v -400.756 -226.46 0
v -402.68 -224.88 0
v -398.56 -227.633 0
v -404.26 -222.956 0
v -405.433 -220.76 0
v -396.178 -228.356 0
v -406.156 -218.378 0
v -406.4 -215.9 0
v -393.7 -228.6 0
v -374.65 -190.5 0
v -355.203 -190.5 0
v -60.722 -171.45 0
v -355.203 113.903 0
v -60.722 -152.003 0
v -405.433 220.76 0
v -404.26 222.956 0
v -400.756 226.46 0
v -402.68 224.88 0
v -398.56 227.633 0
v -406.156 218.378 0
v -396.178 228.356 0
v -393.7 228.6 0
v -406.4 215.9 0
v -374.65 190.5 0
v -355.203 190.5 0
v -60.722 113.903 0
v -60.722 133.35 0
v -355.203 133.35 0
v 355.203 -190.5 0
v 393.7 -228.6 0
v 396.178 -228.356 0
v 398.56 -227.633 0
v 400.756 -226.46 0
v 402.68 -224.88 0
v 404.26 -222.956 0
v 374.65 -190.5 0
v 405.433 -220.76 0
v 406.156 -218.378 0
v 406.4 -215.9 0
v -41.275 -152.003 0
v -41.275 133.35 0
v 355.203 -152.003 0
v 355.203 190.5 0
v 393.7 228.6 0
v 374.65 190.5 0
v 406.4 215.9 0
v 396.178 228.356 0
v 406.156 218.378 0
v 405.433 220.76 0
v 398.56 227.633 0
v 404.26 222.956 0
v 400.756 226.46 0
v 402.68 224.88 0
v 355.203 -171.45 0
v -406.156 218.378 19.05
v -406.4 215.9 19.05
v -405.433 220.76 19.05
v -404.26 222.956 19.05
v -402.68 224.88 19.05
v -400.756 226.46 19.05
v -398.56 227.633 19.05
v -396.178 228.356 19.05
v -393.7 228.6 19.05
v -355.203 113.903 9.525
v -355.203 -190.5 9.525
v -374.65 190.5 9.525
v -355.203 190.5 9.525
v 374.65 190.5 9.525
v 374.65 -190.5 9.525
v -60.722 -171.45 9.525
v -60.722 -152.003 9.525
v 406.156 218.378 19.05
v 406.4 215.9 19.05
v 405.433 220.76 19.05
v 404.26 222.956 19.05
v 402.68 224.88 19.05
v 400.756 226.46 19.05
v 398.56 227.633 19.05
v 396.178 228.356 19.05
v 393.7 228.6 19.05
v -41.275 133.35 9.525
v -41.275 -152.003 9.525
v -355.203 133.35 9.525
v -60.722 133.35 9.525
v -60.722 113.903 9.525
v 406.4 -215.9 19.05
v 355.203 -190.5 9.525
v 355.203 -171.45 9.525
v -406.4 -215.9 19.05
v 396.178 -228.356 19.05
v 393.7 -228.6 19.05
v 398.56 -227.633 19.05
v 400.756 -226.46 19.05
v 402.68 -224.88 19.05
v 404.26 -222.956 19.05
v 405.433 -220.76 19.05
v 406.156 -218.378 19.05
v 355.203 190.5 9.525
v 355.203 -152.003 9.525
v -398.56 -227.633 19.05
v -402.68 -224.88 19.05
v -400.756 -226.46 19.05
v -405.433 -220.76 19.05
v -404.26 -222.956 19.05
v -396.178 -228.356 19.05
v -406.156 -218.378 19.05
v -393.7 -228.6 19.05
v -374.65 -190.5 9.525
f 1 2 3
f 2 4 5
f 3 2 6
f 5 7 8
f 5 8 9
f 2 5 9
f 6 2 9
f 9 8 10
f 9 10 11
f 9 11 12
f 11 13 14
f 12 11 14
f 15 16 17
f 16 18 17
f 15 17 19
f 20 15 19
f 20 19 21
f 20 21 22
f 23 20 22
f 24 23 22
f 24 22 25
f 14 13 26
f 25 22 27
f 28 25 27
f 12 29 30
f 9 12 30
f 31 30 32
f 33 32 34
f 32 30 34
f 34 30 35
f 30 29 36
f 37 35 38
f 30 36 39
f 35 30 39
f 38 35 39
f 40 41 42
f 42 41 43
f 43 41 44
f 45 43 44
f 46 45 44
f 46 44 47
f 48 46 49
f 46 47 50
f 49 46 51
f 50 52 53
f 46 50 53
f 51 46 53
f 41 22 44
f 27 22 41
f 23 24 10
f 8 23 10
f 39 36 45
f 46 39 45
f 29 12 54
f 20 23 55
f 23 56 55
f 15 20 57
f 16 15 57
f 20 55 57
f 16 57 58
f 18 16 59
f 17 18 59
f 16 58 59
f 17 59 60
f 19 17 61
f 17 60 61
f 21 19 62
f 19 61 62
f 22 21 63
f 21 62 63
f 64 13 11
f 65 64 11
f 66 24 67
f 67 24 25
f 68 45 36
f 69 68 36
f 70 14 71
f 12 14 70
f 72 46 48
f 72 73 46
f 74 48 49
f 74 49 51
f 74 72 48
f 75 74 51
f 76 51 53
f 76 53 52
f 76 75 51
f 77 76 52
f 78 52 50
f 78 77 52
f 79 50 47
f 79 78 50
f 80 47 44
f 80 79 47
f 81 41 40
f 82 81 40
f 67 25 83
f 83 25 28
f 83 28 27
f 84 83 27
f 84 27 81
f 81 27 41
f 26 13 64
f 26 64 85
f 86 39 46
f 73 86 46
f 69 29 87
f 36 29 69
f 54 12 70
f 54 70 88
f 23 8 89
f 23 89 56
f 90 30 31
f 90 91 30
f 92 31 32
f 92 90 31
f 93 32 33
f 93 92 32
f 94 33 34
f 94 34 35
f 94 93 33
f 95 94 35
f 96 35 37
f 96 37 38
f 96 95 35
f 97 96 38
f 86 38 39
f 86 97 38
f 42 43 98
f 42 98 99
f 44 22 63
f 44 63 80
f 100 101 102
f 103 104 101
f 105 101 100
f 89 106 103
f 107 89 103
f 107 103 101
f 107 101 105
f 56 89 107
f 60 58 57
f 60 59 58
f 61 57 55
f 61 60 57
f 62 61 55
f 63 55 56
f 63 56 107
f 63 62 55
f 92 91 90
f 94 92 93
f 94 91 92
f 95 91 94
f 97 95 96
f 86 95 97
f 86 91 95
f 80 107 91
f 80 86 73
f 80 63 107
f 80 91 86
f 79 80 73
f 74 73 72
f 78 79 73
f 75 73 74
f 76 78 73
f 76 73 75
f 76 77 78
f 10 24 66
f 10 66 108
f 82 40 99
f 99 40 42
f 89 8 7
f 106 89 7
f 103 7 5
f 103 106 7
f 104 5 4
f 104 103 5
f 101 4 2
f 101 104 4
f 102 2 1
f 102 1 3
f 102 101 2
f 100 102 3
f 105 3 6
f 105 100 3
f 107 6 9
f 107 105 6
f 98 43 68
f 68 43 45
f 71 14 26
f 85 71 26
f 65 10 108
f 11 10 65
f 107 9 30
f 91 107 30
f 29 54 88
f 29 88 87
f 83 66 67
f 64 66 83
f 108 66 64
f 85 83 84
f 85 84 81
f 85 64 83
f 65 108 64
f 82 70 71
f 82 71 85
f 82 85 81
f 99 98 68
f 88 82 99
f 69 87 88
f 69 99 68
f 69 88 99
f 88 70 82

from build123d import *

# Parameters (mm, degrees)
F0_W     = 812.8
F0_H     = 457.2
F1_DEPTH = 19.05
F2_R     = 12.7
F3_W     = 19.446875
F3_H     = 18.653125
F3_H_2   = 266.7
F4_DEPTH = 9.525
F5_W     = 19.446875
F5_H     = 381
F6_DEPTH = 9.525
F7_W     = 313.928125
F7_H     = 19.446875
F7_W_2   = 415.925
F8_DEPTH = 9.525


with BuildPart() as f1:
    # F0 (on Top) → F1 (new body)
    with BuildSketch(Plane.XY):
        Rectangle(F0_W, F0_H)
    extrude(amount=F1_DEPTH)

    # F2
    f2_edges = [f1.edges().sort_by_distance(p)[0] for p in [
        (-406.4, -228.6, 9.525),
        (406.4, -228.6, 9.525),
        (406.4, 228.6, 9.525),
        (-406.4, 228.6, 9.525),
    ]]
    fillet(f2_edges, radius=F2_R)

    # F3 (on face) → F4 (cut)
    with BuildSketch(Plane(origin=(0, 0, 0), x_dir=(1, 0, 0), z_dir=(0, 0, -1))):
        with Locations((-50.998437, 142.676562)):
            Rectangle(F3_W, F3_H)
        with Locations((-50.998437, 0)):
            Rectangle(F3_W, F3_H_2)
    extrude(amount=-F4_DEPTH, mode=Mode.SUBTRACT)

    # F5 (on face) → F6 (cut)
    with BuildSketch(Plane(origin=(0, 0, 0), x_dir=(1, 0, 0), z_dir=(0, 0, -1))):
        with Locations((364.926562, 0)):
            Rectangle(F5_W, F5_H)
        with Locations((-364.926562, 0)):
            Rectangle(F5_W, F5_H)
    extrude(amount=-F6_DEPTH, mode=Mode.SUBTRACT)

    # F7 (on face) → F8 (cut)
    with BuildSketch(Plane(origin=(0, 0, 0), x_dir=(1, 0, 0), z_dir=(0, 0, -1))):
        with Locations((-198.239062, -123.626562)):
            Rectangle(F7_W, F7_H)
        with Locations((147.240625, 161.726562)):
            Rectangle(F7_W_2, F7_H)
    extrude(amount=-F8_DEPTH, mode=Mode.SUBTRACT)


solid = f1.part
